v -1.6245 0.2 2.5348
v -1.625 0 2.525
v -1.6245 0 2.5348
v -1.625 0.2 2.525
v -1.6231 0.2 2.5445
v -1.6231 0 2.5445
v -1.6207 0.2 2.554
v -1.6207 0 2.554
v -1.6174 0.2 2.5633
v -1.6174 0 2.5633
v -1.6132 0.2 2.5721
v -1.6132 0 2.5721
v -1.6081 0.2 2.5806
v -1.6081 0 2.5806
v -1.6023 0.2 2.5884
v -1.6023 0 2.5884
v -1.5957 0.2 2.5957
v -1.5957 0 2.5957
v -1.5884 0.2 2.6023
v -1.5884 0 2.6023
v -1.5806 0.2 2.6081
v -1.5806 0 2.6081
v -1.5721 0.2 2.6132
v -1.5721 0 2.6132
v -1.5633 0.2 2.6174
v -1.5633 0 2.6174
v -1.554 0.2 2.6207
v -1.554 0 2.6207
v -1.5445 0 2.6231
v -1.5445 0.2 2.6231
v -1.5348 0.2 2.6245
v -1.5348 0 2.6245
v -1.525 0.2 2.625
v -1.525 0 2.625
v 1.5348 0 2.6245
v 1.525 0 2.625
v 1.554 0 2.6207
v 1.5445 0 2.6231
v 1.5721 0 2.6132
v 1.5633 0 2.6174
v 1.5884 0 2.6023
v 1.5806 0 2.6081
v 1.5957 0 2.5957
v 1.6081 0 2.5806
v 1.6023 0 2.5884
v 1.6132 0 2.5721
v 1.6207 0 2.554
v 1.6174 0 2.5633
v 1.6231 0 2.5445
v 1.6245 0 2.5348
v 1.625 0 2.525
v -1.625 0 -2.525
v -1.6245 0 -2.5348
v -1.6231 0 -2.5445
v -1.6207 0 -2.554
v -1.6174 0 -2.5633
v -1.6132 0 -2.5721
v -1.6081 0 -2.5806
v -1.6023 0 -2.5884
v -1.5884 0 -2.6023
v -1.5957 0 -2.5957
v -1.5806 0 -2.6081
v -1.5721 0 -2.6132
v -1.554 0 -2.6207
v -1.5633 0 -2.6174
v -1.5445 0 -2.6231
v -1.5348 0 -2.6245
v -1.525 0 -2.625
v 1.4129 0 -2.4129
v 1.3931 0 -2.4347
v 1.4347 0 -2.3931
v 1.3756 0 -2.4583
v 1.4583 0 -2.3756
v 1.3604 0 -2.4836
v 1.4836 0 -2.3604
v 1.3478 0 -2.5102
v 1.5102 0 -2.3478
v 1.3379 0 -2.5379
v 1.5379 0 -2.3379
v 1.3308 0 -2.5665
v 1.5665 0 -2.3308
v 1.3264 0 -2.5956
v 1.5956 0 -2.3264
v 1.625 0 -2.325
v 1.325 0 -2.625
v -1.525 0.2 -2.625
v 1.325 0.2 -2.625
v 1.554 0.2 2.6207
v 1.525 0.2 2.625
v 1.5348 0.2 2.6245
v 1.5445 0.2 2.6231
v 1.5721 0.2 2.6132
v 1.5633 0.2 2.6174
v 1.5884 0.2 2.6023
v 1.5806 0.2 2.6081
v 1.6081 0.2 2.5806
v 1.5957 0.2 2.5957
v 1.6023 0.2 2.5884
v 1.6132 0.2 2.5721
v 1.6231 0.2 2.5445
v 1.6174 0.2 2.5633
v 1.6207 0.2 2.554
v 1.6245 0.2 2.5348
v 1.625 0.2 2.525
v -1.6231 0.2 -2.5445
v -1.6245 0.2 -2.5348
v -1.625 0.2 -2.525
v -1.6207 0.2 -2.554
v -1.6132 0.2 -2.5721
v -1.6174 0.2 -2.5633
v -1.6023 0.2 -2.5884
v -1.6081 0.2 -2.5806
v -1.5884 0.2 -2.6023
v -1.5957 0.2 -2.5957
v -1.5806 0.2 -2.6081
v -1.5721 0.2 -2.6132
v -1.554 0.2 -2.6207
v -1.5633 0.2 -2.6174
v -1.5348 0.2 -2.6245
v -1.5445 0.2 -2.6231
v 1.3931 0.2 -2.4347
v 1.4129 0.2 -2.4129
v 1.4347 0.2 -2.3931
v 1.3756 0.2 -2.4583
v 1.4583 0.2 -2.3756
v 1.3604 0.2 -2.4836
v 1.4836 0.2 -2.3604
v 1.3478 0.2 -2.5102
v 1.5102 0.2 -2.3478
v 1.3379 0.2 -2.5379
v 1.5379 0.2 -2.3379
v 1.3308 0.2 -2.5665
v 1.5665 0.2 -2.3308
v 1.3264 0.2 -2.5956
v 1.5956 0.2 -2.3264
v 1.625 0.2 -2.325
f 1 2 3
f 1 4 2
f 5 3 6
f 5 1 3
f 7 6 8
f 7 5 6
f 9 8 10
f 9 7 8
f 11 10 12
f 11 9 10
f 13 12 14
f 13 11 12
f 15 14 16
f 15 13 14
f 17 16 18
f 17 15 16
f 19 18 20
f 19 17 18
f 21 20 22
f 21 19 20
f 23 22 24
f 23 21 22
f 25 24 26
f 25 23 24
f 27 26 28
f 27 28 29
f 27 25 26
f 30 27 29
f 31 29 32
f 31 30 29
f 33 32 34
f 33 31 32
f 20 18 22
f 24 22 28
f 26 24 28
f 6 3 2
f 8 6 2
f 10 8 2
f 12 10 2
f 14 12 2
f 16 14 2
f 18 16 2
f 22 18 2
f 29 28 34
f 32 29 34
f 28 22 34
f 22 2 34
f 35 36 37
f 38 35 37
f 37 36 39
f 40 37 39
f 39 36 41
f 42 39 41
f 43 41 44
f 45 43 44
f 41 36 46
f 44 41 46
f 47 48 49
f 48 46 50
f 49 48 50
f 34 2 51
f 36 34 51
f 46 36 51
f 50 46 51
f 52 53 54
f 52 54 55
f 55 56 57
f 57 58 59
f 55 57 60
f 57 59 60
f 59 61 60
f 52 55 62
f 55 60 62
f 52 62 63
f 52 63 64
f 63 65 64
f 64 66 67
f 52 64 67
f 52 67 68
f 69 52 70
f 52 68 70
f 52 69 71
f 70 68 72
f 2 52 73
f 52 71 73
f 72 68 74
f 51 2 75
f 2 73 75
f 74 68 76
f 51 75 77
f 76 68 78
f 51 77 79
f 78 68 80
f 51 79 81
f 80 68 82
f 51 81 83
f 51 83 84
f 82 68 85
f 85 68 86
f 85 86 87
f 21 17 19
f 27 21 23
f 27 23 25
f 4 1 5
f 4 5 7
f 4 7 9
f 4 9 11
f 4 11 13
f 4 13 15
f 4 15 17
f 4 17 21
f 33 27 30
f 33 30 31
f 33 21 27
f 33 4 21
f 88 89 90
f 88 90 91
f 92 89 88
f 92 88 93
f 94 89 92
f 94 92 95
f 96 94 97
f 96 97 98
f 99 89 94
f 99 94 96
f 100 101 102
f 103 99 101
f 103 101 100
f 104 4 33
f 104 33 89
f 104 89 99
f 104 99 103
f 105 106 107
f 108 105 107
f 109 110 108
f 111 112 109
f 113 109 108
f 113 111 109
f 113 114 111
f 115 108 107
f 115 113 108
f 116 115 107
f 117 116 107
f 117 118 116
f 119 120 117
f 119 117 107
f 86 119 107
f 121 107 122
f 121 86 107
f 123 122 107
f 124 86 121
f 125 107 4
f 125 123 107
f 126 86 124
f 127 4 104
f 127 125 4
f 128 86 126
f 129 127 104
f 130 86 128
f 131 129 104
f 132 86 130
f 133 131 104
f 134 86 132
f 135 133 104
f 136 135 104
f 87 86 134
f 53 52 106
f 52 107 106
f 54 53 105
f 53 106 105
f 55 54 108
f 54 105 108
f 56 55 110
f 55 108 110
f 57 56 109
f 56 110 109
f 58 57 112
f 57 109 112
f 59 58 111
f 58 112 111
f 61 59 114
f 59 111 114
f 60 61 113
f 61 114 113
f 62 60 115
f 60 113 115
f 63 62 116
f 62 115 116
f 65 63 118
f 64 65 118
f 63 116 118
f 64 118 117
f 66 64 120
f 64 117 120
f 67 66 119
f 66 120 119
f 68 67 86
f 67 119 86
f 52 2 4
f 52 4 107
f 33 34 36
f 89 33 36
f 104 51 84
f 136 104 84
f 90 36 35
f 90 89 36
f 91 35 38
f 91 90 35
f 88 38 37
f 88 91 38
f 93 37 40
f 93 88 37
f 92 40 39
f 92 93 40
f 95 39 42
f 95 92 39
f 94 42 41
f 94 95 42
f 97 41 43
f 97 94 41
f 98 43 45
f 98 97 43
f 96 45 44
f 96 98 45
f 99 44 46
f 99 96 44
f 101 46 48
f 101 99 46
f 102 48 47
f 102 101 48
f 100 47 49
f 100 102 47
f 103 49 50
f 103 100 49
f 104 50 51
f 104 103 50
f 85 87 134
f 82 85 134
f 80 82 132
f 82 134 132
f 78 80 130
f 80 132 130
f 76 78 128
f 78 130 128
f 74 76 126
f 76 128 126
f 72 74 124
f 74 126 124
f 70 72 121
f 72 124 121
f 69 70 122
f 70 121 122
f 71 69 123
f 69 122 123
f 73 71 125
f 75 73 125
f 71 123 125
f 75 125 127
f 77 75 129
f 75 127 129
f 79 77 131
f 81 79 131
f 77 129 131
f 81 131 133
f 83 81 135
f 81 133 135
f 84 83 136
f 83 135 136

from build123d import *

# Parameters (mm, degrees)
SKETCH1_W           = 3.25
SKETCH1_H           = 5.25
BOSS_EXTRUDE1_DEPTH = 0.2
SKETCH2_R           = 0.3
CUT_EXTRUDE1_DEPTH  = 1.2
FILLET1_R           = 0.1


with BuildPart() as part:
    # Sketch1 → Boss-Extrude1 (new body)
    with BuildSketch(Plane(origin=(0, 0, 0), x_dir=(1, 0, 0), z_dir=(0, 1, 0))):
        Rectangle(SKETCH1_W, SKETCH1_H)
    extrude(amount=BOSS_EXTRUDE1_DEPTH)

    # Sketch2 → Cut-Extrude1 (cut, through all)
    with BuildSketch(Plane(origin=(0, 0.2, 0), x_dir=(1, 0, 0), z_dir=(0, 1, 0))):
        with Locations((1.625, 2.625)):
            Circle(SKETCH2_R)
    extrude(amount=-CUT_EXTRUDE1_DEPTH, mode=Mode.SUBTRACT)

    # Fillet1
    fillet1_edges = [part.edges().sort_by_distance(p)[0] for p in [
        (1.625, 0.1, 2.625),
        (-1.625, 0.1, 2.625),
        (-1.625, 0.1, -2.625),
    ]]
    fillet(fillet1_edges, radius=FILLET1_R)


solid = part.part
